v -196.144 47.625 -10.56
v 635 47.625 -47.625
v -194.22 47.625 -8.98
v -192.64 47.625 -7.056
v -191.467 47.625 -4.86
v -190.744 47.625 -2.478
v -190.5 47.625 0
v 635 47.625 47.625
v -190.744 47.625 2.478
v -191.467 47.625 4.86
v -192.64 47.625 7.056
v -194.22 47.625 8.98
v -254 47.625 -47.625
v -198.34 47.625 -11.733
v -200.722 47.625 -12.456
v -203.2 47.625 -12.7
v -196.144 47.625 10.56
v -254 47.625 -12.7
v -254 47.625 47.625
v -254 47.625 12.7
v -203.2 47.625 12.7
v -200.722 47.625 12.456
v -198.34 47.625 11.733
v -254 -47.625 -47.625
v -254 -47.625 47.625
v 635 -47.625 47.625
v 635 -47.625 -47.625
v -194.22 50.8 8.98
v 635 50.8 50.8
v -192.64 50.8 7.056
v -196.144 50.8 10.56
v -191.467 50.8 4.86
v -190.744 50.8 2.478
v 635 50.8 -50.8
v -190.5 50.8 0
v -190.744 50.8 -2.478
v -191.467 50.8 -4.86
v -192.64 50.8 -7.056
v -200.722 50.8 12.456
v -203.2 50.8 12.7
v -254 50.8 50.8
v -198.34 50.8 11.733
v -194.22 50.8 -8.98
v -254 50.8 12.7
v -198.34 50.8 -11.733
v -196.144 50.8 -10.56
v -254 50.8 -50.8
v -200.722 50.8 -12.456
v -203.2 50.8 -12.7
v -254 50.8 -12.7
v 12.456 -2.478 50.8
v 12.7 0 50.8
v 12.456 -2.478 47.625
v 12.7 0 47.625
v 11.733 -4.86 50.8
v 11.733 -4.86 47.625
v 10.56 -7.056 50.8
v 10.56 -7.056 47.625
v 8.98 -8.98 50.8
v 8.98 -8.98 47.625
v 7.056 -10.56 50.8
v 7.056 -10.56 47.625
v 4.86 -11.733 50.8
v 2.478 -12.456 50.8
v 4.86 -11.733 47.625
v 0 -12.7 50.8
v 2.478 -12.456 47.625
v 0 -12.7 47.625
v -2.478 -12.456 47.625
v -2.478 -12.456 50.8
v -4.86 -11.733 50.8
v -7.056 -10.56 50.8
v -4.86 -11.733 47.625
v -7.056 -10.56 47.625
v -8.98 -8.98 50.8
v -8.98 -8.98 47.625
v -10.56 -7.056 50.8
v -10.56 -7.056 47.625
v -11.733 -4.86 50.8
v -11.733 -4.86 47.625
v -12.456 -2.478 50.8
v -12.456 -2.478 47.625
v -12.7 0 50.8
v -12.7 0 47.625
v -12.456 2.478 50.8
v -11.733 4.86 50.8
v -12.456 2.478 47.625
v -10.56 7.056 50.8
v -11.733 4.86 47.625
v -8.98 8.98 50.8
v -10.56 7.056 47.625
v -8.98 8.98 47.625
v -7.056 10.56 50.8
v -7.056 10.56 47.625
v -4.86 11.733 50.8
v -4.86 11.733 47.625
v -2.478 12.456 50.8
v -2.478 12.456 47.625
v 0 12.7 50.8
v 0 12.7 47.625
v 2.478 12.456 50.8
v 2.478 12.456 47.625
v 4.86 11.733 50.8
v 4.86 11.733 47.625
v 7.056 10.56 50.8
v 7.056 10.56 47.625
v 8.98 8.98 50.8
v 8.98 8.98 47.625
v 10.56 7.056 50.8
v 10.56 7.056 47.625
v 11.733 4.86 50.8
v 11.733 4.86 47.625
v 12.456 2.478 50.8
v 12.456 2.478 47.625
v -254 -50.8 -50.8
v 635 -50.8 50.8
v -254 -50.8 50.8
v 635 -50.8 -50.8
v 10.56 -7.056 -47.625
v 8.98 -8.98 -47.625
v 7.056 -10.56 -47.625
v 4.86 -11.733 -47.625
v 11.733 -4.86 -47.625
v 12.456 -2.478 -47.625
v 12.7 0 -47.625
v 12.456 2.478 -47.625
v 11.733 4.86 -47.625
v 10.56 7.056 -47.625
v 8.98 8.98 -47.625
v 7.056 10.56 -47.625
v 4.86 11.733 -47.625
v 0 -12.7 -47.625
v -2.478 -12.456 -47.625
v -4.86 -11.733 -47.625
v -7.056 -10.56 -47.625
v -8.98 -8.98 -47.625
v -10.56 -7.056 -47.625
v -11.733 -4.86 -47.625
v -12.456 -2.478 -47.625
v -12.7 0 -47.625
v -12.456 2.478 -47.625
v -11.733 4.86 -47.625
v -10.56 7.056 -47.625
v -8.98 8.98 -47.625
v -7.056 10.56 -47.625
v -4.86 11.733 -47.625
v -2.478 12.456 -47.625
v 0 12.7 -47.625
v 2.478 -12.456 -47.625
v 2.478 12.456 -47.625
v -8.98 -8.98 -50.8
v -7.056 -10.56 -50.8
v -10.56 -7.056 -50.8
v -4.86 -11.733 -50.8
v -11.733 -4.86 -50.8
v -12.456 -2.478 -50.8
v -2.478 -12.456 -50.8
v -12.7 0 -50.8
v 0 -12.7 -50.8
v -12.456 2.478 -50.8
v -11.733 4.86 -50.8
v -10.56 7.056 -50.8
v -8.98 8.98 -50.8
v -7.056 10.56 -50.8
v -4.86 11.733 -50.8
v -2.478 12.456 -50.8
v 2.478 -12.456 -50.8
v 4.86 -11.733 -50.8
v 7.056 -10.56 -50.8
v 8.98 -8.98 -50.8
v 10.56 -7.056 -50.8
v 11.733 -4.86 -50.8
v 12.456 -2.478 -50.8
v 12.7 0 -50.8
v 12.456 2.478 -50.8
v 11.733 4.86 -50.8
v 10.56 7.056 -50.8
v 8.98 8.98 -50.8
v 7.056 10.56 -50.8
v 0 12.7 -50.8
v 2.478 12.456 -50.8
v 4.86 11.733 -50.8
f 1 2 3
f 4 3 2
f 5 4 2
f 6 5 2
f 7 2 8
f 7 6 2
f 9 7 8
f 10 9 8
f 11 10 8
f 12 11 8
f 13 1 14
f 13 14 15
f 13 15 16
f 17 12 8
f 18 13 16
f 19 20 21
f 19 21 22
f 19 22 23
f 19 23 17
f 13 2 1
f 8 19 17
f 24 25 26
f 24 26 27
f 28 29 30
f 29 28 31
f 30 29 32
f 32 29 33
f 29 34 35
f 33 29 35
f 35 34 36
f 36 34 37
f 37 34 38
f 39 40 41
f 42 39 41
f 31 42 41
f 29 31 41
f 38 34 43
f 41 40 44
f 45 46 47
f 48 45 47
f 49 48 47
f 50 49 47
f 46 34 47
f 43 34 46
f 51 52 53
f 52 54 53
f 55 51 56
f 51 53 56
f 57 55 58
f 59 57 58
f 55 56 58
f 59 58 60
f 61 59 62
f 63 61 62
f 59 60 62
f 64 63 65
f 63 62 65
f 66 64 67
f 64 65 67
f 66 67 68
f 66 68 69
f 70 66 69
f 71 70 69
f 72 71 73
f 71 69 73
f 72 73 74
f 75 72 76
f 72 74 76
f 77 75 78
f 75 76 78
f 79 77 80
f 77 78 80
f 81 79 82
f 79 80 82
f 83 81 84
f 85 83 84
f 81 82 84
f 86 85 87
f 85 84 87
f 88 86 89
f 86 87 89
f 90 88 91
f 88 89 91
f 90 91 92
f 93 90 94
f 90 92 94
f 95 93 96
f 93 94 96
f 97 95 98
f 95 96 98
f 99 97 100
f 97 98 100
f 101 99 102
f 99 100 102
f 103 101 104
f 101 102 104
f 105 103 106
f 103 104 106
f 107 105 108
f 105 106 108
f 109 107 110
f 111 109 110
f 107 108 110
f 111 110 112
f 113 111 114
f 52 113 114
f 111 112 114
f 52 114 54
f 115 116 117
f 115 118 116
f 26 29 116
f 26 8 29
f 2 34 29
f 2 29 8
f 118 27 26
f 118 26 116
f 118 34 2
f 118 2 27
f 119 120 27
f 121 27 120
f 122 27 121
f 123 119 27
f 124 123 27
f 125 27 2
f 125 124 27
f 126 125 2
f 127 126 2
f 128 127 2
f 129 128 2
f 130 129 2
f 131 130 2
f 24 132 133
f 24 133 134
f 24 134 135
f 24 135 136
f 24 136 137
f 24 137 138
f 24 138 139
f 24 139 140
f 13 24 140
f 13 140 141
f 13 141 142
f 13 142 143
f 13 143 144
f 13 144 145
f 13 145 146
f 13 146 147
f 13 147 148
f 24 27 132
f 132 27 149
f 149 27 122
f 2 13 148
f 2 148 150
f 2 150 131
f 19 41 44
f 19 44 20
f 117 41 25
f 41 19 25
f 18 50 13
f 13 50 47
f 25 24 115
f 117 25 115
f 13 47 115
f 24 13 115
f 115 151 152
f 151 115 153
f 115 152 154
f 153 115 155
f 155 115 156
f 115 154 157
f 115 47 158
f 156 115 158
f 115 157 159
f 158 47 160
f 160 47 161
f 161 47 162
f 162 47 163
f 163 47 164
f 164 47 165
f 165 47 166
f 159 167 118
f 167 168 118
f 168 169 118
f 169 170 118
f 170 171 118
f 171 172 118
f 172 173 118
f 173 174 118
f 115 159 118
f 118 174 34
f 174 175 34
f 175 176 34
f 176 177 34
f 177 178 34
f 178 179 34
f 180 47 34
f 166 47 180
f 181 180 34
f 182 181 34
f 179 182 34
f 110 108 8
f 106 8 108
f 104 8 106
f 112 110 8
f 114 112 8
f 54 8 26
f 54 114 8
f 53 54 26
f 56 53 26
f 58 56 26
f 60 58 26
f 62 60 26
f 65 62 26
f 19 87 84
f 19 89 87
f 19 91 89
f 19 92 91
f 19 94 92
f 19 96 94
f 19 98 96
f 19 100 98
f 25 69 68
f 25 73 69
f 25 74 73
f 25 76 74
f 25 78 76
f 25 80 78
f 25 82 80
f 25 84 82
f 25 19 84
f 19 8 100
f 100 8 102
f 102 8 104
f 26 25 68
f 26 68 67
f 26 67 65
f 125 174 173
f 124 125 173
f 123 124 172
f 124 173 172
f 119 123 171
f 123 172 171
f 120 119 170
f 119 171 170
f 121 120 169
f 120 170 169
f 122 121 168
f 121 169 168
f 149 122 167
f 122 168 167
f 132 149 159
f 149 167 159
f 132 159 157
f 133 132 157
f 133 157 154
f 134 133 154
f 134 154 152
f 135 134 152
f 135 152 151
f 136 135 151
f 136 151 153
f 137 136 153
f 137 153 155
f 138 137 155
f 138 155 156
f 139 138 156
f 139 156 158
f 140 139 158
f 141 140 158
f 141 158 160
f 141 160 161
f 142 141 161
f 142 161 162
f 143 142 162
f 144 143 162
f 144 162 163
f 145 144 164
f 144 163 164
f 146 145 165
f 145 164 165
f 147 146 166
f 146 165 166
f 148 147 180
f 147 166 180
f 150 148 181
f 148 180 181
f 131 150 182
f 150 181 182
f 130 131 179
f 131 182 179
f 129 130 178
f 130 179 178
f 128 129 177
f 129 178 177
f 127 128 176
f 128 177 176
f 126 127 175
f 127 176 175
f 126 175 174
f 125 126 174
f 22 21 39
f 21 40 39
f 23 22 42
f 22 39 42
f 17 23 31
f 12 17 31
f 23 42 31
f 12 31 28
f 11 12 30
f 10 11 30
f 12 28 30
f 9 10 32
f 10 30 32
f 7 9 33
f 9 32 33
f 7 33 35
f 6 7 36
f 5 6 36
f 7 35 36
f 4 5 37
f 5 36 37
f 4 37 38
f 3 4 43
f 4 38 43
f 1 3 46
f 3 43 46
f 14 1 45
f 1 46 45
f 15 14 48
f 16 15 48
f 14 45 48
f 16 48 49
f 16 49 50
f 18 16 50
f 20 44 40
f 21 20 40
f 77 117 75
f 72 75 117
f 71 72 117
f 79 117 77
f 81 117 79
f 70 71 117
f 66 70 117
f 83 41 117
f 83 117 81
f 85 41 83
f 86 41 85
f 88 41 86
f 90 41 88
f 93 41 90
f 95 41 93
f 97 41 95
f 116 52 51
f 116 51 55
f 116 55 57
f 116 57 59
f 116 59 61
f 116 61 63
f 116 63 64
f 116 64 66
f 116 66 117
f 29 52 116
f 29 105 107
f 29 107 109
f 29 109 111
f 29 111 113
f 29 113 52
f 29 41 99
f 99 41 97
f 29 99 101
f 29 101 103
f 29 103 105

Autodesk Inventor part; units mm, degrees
ref_plane "YZ Plane" through (0, 0, 0) normal (1, 0, 0) x (0, 1, 0)
ref_plane "XZ Plane" through (0, 0, 0) normal (0, 1, 0) x (-1, 0, 0)
ref_plane "XY Plane" through (0, 0, 0) normal (0, 0, 1) x (1, 0, 0)
sketch "Sketch2" plane through (0, 0, 0) normal (0, 0, 1) x (1, 0, 0)
  circle A0 centre (0, 0) radius 12.7
  line L0 (12.7, 0) -> (635, 0)
  line L1 (635, 0) -> (635, 50.8)
  line L2 (635, 50.8) -> (0, 50.8)
  line L3 (0, 50.8) -> (0, 12.7)
  line L4 (635, 0) -> (635, -50.8)
  line L5 (635, -50.8) -> (0, -50.8)
  line L6 (0, -50.8) -> (0, -12.7)
  line L7 (-12.7, 0) -> (-254, 0)
  line L8 (-254, 0) -> (-254, 50.8)
  line L9 (-254, 50.8) -> (0, 50.8)
  line L10 (0, 50.8) -> (0, 12.7)
  line L11 (0, -50.8) -> (0, -12.7)
  line L12 (-254, 0) -> (-254, -50.8)
  line L13 (-254, -50.8) -> (0, -50.8)
  dimension "d0" = 25.4
  dimension "d1" = 50.8
  dimension "d2" = 635
  dimension "d3" = 254
extrude "Extrusion1" add sketch "Sketch2" along normal mid plane 101.6 contours L0 L4 L5 L6 A0 | A0 L3 L2 L1 L0 | A0 L7 L8 L9 L3 | L6 L13 L12 L7 A0
sketch "Sketch3" plane through (0, 0, 0) normal (1, 0, 0) x (0, 1, 0)
  line L0 (50.8, -50.8) -> (50.8, 50.8) projected
  line L1 (-50.8, -50.8) -> (50.8, -50.8) projected
  line L2 (50.8, 50.8) -> (-50.8, 50.8) projected
  line L3 (-50.8, -50.8) -> (-50.8, 50.8) projected
  line L4 (-50.8, 50.8) -> (-50.8, -50.8)
  line L5 (-50.8, -50.8) -> (50.8, -50.8)
  line L6 (50.8, -50.8) -> (50.8, 50.8)
  line L7 (50.8, 50.8) -> (-50.8, 50.8)
  line L8 (-50.8, 50.8) -> (50.8, -50.8) construction
  line L9 (-50.8, -50.8) -> (50.8, 50.8) construction
  line L10 (-47.625, 47.625) -> (-47.625, -47.625)
  line L11 (-47.625, -47.625) -> (47.625, -47.625)
  line L12 (47.625, -47.625) -> (47.625, 47.625)
  line L13 (47.625, 47.625) -> (-47.625, 47.625)
  line L14 (-47.625, 47.625) -> (47.625, -47.625) construction
  line L15 (-47.625, -47.625) -> (47.625, 47.625) construction
  line L16 (-12.7, 50.8) -> (-12.7, -50.8) projected
  point P0 (0, 0)
  point P1 (-12.7, 47.625)
  point P2 (-12.7, -47.625)
  dimension "d6" = 3.175
  dimension "d7" = 3.175
extrude "Extrusion3" cut sketch "Sketch3" along normal through all both and the other way through all contours L16 L13 L12 L11 | L11 L10 L13 L16
sketch "Sketch4" plane through (-254, 50.8, 50.8) normal (0, 1, 0) x (1, 0, 0)
  line L0 (0, 50.8) -> (50.8, 50.8) construction
  line L1 (0, 98.425) -> (0, 3.175) projected
  line L2 (0, 38.1) -> (50.8, 38.1)
  line L3 (50.8, 63.5) -> (0, 63.5)
  arc A0 (50.8, 38.1) -> (50.8, 63.5) centre (50.8, 50.8) ccw
  line L4 (0, 63.5) -> (0, 38.1)
  point P0 (254, 50.8)
  dimension "d12" = 50.8
  dimension "d13" = 25.4
extrude "SlotForCable" cut sketch "Sketch4" against normal up to surface (3.175 mm away)
equation "\"d2\" = longDistanceFromHole"
equation "\"d3\" = shortDistanceFromHole"
equation "\"materialWidth\" = 101.6"
equation "\"shortDistanceFromHole\" = 254"
equation "\"longDistanceFromHole\" = 635"
properties part number "CatapultArm" material "Aluminum 6061"
